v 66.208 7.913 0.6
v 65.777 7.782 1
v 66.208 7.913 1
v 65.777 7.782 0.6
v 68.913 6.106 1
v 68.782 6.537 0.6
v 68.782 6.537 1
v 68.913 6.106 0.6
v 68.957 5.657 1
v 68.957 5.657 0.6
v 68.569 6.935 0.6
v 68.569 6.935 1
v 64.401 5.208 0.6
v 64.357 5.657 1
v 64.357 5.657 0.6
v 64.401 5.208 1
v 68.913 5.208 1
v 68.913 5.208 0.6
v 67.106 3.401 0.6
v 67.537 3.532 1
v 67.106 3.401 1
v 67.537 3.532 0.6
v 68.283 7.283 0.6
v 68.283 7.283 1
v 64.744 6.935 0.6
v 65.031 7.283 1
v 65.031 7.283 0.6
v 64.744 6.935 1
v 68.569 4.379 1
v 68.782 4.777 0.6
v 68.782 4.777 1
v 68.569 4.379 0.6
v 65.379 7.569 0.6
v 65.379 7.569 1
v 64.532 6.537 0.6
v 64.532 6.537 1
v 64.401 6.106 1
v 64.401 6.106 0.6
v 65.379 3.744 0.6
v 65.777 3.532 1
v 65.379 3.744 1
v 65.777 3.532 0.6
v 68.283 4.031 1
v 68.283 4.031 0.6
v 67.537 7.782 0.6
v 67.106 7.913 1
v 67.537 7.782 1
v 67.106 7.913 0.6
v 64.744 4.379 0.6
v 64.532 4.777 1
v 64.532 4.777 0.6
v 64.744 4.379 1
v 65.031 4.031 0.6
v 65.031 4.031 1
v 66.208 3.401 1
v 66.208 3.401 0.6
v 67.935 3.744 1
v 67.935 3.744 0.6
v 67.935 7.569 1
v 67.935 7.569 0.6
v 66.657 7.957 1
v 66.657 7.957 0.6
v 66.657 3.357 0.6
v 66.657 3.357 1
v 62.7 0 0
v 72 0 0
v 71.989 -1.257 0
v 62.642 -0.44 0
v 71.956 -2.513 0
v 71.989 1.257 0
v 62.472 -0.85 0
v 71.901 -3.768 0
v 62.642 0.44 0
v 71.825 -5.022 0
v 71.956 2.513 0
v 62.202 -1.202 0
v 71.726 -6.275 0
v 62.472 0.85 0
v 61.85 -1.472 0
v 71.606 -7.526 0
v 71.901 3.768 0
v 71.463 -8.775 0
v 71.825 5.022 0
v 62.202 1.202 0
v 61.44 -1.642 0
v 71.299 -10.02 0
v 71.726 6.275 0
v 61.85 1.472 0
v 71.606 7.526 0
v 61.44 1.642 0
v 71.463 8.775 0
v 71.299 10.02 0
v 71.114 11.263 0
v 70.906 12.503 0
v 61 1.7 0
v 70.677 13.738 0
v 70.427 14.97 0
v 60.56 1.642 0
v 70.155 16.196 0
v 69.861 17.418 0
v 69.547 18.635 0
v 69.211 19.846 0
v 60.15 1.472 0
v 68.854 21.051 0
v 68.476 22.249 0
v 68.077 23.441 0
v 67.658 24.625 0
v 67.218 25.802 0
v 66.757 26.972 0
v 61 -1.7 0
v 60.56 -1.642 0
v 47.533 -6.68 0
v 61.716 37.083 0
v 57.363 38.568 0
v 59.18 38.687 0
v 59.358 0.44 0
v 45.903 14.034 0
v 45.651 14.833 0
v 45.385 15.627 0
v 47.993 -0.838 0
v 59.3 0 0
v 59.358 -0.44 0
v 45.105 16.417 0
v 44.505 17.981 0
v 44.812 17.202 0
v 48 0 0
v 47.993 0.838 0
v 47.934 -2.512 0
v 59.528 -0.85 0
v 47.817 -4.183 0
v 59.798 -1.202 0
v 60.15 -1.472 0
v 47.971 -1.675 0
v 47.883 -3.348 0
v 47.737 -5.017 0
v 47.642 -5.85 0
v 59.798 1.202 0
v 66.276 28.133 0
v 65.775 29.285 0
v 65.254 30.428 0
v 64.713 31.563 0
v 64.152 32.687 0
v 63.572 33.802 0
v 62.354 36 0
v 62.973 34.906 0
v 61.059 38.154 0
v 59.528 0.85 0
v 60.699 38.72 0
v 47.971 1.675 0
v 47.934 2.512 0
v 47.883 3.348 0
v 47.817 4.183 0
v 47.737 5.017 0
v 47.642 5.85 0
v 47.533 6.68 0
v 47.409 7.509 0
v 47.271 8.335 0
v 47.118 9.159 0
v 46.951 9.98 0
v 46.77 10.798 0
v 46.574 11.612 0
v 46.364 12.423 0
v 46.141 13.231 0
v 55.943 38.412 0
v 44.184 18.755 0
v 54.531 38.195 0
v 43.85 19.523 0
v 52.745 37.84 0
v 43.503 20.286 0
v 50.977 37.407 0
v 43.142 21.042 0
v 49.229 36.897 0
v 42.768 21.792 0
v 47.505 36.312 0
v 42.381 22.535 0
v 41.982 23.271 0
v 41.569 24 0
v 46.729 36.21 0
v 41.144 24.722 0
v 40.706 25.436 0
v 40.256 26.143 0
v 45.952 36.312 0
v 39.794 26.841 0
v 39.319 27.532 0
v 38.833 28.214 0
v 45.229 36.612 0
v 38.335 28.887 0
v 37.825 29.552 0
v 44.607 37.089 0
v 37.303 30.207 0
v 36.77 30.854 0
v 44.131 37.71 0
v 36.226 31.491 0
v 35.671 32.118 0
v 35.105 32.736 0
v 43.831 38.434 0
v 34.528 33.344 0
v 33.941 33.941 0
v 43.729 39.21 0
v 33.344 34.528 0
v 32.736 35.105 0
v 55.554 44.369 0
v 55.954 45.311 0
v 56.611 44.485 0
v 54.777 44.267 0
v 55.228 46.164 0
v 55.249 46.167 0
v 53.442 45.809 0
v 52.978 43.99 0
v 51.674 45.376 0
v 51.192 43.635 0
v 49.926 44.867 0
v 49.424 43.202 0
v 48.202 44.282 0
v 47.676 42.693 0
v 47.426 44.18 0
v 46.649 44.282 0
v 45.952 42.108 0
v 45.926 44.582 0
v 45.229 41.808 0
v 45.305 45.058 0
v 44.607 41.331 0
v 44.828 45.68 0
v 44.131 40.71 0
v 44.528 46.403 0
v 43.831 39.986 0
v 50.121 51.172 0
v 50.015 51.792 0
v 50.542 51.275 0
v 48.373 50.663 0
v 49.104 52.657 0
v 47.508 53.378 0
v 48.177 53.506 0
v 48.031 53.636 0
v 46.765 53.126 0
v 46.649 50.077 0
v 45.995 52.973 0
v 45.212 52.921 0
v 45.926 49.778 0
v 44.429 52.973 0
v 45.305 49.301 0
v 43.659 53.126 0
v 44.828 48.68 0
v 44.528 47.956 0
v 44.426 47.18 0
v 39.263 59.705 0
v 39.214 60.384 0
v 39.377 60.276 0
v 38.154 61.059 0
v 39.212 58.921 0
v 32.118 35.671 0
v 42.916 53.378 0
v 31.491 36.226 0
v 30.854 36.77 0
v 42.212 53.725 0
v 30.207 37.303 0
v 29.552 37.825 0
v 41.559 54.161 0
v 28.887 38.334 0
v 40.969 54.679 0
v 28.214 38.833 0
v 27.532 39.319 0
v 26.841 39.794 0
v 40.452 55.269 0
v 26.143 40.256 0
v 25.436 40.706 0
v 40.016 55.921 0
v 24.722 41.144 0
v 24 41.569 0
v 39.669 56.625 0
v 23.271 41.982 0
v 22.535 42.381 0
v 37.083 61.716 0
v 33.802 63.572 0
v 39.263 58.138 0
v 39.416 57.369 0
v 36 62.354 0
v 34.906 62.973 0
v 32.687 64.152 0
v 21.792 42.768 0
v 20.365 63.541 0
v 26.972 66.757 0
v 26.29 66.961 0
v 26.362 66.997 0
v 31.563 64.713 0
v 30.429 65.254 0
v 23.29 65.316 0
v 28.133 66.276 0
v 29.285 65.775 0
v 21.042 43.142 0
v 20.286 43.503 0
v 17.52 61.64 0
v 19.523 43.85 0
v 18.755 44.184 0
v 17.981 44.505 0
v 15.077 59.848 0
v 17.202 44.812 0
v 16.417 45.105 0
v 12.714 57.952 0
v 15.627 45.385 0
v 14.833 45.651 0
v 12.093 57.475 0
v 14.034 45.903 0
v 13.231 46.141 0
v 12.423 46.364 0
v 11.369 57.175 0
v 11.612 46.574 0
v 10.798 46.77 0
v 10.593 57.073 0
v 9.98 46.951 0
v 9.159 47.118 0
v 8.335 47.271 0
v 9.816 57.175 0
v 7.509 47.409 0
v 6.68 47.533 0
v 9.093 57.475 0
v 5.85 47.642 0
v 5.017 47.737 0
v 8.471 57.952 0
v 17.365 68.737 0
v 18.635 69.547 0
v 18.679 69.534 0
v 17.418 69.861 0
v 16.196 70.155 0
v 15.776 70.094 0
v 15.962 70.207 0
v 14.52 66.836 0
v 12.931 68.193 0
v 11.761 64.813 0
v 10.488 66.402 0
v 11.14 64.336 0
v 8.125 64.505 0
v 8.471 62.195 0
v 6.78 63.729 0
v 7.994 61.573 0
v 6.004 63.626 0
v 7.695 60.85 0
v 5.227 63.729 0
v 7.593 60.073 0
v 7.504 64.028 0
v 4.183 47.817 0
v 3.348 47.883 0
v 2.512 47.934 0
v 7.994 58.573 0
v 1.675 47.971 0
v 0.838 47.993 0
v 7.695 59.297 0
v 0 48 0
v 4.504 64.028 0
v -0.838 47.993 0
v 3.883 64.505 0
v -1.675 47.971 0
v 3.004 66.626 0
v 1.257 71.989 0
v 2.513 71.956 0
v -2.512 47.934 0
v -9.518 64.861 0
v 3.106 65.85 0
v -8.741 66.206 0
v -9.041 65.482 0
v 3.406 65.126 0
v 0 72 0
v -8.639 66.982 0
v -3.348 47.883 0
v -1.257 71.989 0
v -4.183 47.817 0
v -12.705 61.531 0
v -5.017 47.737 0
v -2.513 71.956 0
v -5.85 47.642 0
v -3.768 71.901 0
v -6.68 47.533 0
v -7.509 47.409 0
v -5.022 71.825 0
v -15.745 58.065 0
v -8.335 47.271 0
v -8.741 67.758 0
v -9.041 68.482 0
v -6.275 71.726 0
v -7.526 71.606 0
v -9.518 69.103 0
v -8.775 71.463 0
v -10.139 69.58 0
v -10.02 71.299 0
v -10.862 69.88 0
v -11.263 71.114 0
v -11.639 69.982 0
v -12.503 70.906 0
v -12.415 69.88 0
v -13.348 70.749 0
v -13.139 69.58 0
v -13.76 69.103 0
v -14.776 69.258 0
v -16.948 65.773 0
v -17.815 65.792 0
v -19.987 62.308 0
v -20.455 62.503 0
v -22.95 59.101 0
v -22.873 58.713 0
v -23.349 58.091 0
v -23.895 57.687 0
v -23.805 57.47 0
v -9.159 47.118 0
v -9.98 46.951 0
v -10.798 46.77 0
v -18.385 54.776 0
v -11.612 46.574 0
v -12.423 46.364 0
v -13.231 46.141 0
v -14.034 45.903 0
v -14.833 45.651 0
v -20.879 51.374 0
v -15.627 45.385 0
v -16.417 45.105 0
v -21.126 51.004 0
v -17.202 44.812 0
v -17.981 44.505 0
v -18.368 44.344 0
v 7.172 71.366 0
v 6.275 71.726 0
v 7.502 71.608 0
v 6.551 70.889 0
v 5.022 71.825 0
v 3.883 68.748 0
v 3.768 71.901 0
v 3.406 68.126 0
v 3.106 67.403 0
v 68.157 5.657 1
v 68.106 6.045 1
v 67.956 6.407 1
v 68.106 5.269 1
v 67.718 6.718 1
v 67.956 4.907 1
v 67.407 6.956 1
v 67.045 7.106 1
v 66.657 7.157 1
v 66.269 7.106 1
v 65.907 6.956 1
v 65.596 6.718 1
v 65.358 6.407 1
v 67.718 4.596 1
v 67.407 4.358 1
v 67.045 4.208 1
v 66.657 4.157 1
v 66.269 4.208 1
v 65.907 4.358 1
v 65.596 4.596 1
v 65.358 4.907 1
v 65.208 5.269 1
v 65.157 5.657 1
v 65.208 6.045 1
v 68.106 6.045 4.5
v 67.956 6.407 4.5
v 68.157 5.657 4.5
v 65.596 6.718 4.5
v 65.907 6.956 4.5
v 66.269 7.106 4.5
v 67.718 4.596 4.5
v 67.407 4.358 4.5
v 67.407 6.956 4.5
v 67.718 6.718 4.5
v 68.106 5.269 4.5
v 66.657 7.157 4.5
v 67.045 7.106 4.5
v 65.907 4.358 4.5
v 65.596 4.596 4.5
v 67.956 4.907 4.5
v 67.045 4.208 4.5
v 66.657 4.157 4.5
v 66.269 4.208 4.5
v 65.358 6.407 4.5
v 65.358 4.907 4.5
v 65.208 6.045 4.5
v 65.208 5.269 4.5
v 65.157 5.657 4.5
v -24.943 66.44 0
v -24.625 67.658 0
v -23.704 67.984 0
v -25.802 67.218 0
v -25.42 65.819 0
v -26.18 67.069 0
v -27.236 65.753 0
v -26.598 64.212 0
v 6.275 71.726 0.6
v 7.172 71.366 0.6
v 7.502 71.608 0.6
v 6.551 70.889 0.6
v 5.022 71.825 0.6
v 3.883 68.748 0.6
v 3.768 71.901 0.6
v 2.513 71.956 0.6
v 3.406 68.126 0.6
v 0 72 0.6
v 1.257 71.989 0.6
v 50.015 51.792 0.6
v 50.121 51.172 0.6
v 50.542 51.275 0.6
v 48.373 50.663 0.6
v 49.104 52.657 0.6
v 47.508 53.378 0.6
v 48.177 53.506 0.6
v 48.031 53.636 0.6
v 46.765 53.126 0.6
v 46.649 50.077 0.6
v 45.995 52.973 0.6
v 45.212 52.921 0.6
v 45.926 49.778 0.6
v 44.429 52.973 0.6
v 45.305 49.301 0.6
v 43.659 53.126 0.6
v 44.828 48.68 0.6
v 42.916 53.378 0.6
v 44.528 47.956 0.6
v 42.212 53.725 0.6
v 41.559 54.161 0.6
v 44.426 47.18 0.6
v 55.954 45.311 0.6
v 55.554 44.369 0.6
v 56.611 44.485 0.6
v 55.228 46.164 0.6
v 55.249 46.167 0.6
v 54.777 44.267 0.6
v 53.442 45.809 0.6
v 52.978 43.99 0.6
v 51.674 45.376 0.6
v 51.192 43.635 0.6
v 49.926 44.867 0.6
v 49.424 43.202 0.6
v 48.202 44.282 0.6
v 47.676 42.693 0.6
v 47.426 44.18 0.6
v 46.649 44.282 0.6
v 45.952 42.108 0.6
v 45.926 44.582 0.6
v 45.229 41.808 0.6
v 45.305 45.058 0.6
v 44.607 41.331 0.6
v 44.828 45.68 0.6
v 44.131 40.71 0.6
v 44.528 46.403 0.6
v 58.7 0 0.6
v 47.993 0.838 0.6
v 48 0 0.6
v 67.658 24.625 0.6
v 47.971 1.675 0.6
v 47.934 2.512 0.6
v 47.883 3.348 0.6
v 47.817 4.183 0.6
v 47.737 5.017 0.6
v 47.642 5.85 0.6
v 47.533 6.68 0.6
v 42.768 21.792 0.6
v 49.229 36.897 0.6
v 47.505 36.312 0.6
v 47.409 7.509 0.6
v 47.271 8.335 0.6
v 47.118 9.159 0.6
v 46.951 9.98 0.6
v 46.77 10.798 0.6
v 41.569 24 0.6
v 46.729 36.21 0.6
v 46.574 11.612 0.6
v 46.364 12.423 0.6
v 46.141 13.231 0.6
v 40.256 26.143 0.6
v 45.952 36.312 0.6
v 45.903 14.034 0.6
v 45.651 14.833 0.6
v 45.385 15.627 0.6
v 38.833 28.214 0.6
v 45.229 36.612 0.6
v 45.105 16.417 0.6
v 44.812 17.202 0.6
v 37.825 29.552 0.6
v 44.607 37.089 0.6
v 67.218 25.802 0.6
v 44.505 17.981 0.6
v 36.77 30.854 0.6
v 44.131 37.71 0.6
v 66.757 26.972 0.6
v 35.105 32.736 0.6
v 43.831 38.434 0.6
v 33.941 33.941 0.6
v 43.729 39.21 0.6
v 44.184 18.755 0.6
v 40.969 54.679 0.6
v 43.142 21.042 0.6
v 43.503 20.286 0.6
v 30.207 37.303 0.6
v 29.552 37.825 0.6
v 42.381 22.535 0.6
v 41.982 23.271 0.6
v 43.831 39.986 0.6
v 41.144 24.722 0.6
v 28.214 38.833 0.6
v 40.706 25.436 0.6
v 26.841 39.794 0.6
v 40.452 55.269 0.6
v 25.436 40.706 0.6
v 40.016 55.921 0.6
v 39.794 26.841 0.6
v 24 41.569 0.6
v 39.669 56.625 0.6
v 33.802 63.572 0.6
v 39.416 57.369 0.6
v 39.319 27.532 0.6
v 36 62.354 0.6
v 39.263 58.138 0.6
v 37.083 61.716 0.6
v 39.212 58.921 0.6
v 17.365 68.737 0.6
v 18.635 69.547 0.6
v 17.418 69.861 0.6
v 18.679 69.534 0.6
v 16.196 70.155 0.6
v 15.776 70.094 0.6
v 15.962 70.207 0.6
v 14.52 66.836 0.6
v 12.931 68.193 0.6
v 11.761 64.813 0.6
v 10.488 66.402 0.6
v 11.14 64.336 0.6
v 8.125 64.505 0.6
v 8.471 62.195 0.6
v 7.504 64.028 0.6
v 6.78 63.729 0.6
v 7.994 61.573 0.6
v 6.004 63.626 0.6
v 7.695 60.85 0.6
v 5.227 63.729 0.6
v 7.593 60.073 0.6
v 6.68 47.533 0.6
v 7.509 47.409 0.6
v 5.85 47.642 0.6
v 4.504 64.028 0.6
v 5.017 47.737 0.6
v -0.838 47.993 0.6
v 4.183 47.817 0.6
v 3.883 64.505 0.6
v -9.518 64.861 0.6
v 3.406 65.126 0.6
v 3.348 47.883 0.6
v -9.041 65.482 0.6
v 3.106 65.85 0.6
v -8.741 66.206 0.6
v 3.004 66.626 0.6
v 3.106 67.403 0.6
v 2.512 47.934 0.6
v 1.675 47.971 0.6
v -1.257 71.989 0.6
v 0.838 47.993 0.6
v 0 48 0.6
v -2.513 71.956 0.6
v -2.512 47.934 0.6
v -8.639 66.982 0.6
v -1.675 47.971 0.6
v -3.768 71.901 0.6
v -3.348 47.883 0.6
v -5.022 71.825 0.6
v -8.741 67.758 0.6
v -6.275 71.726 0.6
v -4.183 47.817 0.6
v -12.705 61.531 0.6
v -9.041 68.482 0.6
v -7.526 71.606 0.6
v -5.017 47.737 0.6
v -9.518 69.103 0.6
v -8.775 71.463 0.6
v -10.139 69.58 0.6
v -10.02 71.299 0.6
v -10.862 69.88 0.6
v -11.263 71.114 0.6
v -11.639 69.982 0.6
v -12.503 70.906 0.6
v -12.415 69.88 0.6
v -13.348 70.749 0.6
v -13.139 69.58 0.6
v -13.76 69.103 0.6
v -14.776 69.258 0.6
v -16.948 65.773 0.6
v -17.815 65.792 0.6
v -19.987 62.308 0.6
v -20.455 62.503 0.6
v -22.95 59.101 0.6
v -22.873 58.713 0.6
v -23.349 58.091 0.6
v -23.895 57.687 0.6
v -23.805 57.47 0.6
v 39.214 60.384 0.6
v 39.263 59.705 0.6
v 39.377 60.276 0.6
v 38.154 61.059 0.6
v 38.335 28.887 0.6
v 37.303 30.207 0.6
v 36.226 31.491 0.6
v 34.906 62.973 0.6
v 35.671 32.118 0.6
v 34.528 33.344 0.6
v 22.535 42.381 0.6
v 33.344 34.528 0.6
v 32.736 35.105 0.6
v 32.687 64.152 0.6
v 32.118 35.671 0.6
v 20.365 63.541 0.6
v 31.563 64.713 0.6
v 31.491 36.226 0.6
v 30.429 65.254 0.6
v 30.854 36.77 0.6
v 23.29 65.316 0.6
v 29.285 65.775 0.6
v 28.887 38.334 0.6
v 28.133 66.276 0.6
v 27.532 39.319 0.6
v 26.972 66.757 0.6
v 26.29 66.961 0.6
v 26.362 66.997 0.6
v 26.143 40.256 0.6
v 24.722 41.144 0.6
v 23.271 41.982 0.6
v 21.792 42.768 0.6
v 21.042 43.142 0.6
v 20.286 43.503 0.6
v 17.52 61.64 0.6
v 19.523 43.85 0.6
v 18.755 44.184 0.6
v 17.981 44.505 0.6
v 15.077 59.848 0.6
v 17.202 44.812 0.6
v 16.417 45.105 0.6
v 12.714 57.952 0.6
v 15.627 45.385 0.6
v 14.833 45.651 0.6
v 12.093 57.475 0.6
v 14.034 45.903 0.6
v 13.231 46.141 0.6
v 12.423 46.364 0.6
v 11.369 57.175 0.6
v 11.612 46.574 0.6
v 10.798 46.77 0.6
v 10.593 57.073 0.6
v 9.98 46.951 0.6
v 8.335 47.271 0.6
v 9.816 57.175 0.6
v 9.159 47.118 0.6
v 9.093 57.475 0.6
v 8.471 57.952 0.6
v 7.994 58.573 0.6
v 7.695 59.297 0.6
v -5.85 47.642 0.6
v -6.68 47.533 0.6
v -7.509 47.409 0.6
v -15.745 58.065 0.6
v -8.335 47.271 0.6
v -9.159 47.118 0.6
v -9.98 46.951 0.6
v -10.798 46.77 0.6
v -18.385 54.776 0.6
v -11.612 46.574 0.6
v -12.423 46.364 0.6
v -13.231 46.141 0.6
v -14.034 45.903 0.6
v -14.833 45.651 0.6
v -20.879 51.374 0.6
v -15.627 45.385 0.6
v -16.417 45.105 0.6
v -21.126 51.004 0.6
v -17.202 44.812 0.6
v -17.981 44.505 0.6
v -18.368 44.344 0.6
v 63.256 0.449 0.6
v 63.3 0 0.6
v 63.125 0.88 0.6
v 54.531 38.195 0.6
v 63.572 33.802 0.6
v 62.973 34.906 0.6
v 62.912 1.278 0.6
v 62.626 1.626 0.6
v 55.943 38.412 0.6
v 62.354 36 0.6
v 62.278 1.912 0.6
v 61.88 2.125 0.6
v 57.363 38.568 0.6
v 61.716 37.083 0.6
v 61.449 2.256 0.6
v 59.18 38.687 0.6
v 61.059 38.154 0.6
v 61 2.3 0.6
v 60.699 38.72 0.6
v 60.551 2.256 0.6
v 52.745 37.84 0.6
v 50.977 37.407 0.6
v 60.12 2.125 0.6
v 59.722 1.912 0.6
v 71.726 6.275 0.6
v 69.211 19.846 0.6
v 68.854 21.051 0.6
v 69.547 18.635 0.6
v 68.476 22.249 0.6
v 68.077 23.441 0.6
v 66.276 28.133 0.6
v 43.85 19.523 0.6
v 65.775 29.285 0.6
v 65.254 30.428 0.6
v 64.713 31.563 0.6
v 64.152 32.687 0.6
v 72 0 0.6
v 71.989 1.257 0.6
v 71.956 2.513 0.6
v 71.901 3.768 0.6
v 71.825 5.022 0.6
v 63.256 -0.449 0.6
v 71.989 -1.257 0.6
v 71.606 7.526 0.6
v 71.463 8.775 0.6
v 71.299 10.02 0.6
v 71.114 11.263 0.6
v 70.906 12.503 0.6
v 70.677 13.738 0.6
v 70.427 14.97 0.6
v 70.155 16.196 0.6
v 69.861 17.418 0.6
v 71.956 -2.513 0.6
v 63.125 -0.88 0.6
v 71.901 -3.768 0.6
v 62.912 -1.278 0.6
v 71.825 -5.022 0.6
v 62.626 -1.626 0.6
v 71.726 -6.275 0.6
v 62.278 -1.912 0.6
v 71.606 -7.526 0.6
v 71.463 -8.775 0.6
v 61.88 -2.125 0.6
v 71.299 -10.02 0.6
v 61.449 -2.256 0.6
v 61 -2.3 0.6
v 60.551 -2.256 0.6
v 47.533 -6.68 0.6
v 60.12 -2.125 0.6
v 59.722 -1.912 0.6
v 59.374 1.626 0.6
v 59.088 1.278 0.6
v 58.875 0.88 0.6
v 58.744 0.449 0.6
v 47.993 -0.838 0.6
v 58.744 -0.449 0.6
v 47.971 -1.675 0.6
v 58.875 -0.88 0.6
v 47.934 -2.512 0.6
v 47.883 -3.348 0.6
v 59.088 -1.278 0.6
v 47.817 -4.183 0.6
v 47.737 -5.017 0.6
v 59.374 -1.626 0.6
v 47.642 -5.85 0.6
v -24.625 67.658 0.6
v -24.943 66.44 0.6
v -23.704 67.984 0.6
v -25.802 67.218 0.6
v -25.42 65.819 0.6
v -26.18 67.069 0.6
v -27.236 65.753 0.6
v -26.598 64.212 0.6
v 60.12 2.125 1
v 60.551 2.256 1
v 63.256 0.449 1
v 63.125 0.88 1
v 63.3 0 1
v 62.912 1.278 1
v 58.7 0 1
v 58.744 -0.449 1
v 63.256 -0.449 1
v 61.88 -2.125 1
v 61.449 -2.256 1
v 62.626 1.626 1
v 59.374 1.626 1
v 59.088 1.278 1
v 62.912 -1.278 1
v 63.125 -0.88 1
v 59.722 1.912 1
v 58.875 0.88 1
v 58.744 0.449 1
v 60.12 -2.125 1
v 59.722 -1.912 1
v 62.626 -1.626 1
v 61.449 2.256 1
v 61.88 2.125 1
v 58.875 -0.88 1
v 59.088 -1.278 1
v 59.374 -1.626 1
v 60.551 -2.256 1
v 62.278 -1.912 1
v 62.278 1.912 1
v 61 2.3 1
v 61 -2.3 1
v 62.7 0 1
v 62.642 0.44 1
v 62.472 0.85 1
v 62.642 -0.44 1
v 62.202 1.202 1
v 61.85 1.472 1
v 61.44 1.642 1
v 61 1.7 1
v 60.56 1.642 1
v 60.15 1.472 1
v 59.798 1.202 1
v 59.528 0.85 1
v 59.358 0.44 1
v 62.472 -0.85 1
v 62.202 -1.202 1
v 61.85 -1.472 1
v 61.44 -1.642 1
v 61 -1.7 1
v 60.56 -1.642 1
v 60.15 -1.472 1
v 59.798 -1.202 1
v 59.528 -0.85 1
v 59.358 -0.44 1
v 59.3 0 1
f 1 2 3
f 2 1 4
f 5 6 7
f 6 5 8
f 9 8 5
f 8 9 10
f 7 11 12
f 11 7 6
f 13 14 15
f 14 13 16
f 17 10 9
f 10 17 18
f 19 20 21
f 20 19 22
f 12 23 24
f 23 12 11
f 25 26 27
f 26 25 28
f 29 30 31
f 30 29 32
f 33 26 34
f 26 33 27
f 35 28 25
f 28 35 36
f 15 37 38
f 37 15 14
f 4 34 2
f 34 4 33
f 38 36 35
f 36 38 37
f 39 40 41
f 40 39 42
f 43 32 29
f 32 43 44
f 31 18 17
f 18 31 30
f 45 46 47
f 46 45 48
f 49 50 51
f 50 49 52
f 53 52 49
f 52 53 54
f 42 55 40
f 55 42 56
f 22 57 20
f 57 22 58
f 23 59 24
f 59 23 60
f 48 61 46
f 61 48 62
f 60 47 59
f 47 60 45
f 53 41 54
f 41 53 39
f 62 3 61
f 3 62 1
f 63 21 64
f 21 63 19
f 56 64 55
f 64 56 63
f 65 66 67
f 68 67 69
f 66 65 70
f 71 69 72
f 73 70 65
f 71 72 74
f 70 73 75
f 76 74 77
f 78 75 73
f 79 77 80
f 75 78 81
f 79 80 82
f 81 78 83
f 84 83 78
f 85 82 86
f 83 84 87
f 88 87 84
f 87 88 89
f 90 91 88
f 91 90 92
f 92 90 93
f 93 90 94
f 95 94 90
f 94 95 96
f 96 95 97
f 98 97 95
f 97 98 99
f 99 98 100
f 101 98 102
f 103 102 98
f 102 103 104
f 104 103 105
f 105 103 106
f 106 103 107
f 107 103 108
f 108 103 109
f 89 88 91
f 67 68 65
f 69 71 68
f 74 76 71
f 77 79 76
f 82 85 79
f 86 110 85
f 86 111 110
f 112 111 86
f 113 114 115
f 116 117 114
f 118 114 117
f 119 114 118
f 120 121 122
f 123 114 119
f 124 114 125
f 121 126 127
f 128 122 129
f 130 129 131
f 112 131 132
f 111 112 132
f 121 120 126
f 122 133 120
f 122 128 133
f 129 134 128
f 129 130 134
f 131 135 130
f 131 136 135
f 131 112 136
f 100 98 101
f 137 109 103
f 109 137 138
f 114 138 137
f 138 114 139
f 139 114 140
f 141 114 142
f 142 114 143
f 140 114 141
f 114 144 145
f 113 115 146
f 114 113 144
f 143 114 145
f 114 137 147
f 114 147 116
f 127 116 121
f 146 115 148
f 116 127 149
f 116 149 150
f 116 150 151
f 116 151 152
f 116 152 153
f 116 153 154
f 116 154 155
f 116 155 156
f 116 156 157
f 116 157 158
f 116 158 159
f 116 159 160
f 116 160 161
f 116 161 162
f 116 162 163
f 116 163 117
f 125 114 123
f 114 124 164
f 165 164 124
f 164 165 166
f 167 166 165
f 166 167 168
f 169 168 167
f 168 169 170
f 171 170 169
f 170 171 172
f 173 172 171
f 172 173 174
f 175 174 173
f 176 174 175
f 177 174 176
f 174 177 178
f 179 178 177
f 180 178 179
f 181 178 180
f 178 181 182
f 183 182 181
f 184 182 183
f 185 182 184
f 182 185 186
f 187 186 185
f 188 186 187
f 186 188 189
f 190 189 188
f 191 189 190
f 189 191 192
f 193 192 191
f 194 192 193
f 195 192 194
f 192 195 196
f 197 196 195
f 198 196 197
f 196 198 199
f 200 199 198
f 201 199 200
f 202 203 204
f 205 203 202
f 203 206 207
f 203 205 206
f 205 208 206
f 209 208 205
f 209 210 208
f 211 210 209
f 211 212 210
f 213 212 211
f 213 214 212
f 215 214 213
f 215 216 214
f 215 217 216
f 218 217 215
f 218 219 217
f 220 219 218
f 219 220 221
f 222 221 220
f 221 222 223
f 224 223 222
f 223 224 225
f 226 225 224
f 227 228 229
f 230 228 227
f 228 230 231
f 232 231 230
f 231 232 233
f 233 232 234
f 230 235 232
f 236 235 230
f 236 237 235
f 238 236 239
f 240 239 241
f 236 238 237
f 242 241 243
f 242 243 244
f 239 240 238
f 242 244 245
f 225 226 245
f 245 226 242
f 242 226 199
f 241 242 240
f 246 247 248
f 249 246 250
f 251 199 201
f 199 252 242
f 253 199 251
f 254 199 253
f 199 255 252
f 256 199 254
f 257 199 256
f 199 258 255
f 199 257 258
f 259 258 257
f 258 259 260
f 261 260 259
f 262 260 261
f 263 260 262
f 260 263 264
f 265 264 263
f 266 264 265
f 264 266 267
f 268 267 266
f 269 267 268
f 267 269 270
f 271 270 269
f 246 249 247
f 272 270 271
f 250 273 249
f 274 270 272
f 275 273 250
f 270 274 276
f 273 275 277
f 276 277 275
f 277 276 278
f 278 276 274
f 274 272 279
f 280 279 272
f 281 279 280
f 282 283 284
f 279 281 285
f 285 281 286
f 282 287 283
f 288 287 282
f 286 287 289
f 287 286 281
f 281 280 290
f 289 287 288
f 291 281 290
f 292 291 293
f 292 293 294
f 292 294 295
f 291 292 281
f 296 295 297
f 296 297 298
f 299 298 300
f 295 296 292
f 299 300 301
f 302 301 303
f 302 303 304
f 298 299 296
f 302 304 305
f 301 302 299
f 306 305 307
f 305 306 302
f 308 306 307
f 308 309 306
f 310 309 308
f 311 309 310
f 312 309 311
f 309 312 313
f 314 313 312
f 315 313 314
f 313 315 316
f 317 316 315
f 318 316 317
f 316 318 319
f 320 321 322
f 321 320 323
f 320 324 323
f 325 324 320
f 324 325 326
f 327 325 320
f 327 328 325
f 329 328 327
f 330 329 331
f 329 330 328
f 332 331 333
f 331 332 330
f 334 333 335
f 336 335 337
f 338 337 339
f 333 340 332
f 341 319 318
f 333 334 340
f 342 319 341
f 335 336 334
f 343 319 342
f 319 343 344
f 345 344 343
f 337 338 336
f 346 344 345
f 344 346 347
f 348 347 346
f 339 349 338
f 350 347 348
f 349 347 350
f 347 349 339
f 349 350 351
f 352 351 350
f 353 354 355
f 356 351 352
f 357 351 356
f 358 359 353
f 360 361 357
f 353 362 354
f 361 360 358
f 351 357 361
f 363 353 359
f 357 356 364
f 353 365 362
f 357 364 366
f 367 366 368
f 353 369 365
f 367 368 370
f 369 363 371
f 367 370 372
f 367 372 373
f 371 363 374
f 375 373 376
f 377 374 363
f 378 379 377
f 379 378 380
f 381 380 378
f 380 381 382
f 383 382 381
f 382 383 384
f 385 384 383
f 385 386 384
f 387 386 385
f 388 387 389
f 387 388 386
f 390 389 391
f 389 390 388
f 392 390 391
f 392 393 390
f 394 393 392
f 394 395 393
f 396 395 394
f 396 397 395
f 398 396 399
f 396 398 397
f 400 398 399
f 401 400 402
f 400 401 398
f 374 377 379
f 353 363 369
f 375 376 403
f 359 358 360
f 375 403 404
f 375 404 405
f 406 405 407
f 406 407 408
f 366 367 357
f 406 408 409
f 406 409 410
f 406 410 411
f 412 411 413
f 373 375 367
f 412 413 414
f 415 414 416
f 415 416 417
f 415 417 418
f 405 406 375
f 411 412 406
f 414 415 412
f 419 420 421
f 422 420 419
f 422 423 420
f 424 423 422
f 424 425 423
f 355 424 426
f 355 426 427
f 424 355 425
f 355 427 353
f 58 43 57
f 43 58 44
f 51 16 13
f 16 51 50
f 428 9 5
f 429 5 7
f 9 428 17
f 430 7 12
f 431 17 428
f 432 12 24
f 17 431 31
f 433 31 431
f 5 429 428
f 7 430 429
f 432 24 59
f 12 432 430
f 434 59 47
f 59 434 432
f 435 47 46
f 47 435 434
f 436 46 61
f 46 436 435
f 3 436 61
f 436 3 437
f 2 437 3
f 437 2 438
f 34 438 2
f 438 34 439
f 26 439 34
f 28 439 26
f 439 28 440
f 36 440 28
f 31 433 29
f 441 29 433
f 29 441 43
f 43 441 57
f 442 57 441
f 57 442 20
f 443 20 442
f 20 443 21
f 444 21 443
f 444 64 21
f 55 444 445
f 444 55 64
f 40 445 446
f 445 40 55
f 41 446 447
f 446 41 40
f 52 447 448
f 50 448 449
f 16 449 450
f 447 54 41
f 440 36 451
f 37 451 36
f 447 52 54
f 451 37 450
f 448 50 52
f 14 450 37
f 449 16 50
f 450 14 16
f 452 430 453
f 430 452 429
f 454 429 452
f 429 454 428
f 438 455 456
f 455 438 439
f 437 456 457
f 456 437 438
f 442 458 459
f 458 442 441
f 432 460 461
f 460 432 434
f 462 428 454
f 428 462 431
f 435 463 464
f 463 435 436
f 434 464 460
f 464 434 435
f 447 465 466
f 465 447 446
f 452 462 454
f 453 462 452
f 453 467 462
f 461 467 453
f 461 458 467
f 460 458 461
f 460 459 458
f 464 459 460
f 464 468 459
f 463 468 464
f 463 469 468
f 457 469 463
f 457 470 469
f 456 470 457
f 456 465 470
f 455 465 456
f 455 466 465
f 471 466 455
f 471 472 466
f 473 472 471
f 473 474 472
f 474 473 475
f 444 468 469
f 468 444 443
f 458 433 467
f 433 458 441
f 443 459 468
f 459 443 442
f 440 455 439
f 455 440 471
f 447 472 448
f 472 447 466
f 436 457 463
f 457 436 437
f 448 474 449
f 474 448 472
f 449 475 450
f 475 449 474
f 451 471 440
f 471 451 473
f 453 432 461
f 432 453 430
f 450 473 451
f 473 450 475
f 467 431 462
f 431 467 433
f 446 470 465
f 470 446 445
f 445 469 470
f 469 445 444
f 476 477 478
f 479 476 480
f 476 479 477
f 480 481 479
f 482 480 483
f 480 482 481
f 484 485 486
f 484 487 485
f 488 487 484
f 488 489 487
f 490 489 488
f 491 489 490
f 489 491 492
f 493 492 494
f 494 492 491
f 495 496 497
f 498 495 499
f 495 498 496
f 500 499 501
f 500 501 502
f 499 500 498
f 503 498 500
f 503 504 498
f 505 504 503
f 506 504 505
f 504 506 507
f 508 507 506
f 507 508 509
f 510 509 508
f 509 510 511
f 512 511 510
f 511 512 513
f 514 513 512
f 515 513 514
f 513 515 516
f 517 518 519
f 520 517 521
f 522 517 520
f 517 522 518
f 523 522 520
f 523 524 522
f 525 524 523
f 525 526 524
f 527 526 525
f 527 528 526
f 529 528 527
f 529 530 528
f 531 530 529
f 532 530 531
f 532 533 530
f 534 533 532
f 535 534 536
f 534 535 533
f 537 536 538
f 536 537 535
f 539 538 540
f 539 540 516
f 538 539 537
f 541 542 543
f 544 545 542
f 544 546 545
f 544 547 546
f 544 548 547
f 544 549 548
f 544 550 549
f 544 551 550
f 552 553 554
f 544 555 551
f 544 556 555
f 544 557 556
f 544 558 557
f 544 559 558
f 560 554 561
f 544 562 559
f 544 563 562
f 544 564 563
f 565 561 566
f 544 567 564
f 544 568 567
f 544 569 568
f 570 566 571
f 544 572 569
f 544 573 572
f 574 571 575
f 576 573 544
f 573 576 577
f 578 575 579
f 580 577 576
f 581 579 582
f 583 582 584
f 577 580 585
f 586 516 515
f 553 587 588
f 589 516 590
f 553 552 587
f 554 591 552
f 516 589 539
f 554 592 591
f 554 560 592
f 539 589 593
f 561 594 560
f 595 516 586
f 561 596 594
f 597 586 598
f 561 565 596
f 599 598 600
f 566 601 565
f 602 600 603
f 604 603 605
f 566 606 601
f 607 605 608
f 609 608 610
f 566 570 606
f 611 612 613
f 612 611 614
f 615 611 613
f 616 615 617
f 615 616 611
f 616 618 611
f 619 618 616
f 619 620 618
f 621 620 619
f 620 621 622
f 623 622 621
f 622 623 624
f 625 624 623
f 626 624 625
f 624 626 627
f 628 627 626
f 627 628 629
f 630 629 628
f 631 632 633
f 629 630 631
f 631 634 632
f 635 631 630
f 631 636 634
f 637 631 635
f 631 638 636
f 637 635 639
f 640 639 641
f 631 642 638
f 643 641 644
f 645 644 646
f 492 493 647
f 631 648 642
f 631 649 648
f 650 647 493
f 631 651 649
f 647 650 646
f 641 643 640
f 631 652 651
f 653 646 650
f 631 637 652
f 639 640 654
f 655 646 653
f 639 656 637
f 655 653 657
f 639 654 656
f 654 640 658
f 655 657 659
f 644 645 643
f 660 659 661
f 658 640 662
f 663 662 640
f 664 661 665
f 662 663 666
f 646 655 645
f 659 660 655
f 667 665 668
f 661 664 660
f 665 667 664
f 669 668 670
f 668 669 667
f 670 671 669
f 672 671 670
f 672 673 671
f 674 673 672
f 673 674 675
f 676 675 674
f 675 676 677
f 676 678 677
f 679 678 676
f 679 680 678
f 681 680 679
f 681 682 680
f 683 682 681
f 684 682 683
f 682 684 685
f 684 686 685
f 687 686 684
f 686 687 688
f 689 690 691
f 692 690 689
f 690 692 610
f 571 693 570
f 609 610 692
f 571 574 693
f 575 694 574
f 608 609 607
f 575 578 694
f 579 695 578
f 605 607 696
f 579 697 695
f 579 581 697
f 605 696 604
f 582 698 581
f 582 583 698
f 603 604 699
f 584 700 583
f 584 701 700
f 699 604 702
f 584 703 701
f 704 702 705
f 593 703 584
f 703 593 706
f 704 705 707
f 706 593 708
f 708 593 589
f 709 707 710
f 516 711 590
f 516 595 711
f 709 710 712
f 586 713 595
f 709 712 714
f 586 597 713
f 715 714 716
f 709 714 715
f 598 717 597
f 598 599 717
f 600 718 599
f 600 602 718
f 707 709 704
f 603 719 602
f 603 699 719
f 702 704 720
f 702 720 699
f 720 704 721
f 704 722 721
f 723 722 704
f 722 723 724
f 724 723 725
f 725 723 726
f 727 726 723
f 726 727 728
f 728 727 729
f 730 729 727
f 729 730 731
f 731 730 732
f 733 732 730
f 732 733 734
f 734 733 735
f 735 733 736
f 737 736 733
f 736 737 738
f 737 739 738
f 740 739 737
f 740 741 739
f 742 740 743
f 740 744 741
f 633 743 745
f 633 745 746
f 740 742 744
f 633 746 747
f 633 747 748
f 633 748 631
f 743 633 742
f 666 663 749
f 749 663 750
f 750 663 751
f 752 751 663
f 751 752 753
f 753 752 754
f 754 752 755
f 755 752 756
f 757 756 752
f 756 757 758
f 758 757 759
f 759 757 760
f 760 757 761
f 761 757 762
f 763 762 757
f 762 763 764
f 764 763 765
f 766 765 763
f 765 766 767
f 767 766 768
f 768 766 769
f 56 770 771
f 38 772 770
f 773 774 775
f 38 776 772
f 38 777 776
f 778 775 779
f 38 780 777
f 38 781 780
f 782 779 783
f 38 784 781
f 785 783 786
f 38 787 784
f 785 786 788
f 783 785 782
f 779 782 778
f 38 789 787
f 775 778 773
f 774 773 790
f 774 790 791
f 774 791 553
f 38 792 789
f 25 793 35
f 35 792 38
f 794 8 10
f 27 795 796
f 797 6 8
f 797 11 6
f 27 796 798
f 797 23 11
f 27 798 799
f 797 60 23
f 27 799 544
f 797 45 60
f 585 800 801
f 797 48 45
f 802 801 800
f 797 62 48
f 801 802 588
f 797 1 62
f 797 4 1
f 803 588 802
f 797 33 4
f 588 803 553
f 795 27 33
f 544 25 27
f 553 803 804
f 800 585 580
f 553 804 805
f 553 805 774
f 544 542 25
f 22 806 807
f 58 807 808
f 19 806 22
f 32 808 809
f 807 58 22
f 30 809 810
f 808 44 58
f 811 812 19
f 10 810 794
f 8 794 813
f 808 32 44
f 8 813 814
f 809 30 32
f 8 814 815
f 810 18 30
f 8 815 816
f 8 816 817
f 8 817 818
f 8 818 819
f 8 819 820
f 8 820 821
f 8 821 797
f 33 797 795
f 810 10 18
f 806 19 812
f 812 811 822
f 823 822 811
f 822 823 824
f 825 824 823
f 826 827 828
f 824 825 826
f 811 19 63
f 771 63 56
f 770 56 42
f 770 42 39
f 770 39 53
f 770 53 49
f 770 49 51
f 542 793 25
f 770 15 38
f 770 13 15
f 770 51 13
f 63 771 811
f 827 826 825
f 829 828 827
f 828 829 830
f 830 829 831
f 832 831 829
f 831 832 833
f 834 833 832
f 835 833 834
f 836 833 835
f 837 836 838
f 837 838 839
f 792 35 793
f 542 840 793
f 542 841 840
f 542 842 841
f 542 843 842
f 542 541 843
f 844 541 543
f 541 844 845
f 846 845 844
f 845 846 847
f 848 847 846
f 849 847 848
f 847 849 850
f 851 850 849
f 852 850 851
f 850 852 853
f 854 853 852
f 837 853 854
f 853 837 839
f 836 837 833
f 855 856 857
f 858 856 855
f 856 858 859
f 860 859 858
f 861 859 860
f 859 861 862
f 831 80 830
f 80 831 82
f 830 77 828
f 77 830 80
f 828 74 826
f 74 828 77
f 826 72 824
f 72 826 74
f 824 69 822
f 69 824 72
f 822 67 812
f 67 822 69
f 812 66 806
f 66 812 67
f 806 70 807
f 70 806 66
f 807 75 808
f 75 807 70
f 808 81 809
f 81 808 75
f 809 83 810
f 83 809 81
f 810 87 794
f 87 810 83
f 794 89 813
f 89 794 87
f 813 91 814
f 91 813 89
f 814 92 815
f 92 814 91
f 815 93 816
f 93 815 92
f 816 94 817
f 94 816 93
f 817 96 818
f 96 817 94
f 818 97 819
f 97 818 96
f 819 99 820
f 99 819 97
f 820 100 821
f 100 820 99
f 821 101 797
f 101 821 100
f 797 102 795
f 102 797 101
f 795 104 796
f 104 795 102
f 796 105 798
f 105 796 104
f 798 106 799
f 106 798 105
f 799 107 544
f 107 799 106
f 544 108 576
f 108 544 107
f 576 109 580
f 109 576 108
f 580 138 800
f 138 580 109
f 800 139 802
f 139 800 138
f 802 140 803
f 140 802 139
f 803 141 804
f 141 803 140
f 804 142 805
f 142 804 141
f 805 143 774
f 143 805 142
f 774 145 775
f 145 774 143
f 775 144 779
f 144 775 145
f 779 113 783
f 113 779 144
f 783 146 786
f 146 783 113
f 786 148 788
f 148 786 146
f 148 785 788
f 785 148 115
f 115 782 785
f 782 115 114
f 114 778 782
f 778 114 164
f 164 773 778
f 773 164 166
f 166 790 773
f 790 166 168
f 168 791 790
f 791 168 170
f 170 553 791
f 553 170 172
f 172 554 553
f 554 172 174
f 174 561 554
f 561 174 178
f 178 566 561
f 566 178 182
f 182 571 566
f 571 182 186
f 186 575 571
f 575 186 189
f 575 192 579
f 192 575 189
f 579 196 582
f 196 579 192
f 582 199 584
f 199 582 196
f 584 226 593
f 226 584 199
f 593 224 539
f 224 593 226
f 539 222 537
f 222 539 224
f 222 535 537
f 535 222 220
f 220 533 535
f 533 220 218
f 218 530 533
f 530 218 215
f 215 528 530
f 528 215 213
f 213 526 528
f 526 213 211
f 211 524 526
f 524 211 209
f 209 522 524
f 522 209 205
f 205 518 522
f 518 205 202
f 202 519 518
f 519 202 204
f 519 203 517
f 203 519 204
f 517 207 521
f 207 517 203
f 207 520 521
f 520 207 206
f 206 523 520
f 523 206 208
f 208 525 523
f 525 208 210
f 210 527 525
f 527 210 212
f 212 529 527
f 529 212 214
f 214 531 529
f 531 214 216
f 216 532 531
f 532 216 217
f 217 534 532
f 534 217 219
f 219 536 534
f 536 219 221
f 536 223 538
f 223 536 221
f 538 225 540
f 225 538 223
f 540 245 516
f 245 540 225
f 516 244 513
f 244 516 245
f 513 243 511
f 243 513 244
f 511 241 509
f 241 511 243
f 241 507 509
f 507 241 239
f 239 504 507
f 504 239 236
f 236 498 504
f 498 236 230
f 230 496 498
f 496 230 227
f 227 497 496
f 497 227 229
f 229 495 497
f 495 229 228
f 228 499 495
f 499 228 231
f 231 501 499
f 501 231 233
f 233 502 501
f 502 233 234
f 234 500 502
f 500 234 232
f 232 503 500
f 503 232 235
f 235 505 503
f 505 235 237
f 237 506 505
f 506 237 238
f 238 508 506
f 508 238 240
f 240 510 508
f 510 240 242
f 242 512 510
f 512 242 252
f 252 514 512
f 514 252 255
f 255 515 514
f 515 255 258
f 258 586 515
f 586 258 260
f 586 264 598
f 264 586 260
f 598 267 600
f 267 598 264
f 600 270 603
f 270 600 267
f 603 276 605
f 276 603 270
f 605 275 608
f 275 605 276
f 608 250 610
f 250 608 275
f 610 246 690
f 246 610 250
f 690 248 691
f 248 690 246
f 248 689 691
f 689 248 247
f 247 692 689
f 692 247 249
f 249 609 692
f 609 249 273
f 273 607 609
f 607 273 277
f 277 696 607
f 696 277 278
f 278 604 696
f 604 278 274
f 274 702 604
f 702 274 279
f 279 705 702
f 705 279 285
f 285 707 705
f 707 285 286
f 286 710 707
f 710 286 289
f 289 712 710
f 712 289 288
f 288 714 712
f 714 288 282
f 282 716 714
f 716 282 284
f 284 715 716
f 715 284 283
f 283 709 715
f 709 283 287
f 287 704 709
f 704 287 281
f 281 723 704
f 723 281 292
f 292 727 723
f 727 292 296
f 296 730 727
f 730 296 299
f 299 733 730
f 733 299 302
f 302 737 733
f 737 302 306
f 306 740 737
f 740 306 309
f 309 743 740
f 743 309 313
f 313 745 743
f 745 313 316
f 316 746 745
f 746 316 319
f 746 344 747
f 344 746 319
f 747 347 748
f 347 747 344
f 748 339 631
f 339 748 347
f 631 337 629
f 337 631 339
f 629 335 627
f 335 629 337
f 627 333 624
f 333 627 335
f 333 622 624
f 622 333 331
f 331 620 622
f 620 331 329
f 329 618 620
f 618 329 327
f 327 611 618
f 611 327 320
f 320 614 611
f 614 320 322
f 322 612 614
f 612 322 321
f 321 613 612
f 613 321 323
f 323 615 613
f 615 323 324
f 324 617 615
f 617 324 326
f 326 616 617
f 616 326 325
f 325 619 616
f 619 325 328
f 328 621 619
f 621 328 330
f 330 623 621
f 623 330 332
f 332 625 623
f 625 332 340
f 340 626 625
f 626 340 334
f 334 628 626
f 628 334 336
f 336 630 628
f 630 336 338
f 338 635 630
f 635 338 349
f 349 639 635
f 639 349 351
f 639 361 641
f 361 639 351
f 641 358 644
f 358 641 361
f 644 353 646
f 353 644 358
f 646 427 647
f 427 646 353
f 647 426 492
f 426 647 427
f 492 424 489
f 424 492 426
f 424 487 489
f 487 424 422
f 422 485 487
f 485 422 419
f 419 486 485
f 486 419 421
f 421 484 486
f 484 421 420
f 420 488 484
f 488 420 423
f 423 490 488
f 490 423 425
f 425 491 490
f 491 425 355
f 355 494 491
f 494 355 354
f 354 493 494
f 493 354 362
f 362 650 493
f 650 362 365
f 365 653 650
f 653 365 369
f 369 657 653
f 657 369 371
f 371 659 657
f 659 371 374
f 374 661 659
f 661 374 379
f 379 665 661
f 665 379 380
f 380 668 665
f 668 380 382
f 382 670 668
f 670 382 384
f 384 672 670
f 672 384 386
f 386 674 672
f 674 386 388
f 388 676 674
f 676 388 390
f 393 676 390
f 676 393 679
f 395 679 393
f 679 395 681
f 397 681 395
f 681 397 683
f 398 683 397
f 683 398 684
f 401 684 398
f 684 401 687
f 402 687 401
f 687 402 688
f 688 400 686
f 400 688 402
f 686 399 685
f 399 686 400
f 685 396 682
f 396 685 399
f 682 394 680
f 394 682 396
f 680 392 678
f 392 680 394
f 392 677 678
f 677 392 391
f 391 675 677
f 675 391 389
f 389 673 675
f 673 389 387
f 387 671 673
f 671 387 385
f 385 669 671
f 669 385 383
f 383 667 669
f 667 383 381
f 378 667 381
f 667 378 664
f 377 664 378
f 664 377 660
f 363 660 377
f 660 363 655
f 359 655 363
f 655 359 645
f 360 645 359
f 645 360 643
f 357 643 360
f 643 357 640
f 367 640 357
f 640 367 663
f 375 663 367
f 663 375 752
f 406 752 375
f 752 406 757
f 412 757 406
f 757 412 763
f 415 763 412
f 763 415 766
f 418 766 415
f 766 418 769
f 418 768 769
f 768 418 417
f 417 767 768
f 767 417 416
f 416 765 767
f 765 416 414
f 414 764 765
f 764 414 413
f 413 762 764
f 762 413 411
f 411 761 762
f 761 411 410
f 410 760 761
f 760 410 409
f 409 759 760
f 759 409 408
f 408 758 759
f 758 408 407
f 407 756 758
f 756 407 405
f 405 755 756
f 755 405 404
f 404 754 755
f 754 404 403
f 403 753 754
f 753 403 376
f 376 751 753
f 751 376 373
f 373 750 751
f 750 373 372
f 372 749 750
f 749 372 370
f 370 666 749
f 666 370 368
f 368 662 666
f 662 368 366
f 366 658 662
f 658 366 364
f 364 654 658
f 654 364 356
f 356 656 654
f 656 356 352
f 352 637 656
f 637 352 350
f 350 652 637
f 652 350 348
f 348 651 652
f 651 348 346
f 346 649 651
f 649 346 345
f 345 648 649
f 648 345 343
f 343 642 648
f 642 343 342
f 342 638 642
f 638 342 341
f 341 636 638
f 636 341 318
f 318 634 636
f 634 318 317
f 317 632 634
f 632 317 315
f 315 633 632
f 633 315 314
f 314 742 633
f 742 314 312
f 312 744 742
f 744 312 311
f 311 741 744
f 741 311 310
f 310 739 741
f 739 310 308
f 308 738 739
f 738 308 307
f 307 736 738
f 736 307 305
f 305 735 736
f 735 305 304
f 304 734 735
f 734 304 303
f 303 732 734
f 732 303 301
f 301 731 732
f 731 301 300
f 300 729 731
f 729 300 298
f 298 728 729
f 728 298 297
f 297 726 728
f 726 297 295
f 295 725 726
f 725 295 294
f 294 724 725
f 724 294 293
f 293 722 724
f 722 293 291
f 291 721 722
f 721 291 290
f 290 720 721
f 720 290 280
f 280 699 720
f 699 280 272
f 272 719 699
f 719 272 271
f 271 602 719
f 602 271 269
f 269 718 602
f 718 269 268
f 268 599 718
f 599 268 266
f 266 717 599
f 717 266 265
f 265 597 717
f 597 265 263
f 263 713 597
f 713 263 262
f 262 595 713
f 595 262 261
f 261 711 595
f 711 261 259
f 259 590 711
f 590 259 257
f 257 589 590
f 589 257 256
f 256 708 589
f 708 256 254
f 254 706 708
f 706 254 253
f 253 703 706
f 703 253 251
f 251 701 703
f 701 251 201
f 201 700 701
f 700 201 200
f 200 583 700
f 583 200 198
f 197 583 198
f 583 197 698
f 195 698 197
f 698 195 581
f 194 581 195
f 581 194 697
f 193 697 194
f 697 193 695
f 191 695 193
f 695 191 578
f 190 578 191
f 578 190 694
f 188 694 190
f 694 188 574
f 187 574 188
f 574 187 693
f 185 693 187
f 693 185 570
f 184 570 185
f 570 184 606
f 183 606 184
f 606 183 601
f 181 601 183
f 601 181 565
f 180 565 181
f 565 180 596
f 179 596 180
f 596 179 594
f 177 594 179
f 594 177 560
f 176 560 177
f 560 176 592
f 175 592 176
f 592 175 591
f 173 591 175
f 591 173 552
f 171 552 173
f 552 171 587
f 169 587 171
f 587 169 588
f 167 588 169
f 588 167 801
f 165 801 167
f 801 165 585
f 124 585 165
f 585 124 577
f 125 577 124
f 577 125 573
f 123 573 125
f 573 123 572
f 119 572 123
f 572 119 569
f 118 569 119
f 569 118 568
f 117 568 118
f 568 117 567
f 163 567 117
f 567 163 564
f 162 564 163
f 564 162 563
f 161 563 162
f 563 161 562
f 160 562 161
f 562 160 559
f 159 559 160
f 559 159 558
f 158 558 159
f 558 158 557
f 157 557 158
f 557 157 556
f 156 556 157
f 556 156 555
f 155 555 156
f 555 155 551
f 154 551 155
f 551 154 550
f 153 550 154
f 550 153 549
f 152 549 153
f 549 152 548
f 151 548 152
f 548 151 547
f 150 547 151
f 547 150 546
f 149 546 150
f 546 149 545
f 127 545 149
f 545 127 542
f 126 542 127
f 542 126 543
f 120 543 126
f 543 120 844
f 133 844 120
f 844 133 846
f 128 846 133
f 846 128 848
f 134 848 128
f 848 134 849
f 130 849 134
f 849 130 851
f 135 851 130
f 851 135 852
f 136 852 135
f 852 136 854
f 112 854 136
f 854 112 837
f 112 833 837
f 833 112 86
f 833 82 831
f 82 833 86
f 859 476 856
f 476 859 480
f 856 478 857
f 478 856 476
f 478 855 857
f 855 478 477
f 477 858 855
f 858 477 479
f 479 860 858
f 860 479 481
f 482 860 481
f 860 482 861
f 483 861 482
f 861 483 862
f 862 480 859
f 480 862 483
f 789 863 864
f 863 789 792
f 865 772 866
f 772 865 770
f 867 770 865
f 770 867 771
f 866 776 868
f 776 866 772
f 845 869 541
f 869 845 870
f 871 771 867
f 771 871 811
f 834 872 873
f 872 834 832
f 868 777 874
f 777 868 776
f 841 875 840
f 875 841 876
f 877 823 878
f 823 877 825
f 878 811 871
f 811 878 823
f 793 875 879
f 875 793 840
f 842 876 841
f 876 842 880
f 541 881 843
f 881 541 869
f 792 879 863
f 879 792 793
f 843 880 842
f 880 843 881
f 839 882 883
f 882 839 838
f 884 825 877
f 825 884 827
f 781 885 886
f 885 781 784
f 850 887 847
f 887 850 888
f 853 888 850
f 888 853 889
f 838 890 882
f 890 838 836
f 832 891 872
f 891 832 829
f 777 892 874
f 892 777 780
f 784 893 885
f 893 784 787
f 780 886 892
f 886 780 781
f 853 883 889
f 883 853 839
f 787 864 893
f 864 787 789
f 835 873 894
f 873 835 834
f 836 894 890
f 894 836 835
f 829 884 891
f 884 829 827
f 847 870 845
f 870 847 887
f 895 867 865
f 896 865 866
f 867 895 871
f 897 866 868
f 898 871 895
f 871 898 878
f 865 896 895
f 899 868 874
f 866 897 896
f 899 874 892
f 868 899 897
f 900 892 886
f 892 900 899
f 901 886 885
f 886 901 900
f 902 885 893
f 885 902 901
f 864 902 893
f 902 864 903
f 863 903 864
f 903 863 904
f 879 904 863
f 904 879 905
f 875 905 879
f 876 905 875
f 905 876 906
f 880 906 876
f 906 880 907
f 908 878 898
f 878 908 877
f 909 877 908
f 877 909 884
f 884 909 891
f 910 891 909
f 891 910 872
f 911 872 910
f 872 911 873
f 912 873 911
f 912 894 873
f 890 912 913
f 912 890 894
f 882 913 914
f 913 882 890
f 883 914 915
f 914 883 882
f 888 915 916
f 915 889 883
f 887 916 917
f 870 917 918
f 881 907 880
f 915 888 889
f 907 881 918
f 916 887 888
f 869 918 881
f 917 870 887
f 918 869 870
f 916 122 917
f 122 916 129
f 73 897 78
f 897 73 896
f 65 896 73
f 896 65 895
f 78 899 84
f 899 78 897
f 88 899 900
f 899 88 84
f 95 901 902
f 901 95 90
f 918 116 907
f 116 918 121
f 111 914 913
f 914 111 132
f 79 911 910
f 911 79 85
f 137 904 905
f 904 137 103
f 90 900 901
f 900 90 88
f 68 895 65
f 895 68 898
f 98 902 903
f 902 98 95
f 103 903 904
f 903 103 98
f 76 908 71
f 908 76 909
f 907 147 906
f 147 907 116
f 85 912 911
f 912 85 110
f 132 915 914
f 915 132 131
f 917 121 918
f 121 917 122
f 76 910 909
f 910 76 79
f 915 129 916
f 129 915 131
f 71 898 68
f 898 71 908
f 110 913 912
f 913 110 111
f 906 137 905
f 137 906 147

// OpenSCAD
include <../lib/servo-duct-manifold-lib.scad>;
$fn = 96;
iris_blade();
